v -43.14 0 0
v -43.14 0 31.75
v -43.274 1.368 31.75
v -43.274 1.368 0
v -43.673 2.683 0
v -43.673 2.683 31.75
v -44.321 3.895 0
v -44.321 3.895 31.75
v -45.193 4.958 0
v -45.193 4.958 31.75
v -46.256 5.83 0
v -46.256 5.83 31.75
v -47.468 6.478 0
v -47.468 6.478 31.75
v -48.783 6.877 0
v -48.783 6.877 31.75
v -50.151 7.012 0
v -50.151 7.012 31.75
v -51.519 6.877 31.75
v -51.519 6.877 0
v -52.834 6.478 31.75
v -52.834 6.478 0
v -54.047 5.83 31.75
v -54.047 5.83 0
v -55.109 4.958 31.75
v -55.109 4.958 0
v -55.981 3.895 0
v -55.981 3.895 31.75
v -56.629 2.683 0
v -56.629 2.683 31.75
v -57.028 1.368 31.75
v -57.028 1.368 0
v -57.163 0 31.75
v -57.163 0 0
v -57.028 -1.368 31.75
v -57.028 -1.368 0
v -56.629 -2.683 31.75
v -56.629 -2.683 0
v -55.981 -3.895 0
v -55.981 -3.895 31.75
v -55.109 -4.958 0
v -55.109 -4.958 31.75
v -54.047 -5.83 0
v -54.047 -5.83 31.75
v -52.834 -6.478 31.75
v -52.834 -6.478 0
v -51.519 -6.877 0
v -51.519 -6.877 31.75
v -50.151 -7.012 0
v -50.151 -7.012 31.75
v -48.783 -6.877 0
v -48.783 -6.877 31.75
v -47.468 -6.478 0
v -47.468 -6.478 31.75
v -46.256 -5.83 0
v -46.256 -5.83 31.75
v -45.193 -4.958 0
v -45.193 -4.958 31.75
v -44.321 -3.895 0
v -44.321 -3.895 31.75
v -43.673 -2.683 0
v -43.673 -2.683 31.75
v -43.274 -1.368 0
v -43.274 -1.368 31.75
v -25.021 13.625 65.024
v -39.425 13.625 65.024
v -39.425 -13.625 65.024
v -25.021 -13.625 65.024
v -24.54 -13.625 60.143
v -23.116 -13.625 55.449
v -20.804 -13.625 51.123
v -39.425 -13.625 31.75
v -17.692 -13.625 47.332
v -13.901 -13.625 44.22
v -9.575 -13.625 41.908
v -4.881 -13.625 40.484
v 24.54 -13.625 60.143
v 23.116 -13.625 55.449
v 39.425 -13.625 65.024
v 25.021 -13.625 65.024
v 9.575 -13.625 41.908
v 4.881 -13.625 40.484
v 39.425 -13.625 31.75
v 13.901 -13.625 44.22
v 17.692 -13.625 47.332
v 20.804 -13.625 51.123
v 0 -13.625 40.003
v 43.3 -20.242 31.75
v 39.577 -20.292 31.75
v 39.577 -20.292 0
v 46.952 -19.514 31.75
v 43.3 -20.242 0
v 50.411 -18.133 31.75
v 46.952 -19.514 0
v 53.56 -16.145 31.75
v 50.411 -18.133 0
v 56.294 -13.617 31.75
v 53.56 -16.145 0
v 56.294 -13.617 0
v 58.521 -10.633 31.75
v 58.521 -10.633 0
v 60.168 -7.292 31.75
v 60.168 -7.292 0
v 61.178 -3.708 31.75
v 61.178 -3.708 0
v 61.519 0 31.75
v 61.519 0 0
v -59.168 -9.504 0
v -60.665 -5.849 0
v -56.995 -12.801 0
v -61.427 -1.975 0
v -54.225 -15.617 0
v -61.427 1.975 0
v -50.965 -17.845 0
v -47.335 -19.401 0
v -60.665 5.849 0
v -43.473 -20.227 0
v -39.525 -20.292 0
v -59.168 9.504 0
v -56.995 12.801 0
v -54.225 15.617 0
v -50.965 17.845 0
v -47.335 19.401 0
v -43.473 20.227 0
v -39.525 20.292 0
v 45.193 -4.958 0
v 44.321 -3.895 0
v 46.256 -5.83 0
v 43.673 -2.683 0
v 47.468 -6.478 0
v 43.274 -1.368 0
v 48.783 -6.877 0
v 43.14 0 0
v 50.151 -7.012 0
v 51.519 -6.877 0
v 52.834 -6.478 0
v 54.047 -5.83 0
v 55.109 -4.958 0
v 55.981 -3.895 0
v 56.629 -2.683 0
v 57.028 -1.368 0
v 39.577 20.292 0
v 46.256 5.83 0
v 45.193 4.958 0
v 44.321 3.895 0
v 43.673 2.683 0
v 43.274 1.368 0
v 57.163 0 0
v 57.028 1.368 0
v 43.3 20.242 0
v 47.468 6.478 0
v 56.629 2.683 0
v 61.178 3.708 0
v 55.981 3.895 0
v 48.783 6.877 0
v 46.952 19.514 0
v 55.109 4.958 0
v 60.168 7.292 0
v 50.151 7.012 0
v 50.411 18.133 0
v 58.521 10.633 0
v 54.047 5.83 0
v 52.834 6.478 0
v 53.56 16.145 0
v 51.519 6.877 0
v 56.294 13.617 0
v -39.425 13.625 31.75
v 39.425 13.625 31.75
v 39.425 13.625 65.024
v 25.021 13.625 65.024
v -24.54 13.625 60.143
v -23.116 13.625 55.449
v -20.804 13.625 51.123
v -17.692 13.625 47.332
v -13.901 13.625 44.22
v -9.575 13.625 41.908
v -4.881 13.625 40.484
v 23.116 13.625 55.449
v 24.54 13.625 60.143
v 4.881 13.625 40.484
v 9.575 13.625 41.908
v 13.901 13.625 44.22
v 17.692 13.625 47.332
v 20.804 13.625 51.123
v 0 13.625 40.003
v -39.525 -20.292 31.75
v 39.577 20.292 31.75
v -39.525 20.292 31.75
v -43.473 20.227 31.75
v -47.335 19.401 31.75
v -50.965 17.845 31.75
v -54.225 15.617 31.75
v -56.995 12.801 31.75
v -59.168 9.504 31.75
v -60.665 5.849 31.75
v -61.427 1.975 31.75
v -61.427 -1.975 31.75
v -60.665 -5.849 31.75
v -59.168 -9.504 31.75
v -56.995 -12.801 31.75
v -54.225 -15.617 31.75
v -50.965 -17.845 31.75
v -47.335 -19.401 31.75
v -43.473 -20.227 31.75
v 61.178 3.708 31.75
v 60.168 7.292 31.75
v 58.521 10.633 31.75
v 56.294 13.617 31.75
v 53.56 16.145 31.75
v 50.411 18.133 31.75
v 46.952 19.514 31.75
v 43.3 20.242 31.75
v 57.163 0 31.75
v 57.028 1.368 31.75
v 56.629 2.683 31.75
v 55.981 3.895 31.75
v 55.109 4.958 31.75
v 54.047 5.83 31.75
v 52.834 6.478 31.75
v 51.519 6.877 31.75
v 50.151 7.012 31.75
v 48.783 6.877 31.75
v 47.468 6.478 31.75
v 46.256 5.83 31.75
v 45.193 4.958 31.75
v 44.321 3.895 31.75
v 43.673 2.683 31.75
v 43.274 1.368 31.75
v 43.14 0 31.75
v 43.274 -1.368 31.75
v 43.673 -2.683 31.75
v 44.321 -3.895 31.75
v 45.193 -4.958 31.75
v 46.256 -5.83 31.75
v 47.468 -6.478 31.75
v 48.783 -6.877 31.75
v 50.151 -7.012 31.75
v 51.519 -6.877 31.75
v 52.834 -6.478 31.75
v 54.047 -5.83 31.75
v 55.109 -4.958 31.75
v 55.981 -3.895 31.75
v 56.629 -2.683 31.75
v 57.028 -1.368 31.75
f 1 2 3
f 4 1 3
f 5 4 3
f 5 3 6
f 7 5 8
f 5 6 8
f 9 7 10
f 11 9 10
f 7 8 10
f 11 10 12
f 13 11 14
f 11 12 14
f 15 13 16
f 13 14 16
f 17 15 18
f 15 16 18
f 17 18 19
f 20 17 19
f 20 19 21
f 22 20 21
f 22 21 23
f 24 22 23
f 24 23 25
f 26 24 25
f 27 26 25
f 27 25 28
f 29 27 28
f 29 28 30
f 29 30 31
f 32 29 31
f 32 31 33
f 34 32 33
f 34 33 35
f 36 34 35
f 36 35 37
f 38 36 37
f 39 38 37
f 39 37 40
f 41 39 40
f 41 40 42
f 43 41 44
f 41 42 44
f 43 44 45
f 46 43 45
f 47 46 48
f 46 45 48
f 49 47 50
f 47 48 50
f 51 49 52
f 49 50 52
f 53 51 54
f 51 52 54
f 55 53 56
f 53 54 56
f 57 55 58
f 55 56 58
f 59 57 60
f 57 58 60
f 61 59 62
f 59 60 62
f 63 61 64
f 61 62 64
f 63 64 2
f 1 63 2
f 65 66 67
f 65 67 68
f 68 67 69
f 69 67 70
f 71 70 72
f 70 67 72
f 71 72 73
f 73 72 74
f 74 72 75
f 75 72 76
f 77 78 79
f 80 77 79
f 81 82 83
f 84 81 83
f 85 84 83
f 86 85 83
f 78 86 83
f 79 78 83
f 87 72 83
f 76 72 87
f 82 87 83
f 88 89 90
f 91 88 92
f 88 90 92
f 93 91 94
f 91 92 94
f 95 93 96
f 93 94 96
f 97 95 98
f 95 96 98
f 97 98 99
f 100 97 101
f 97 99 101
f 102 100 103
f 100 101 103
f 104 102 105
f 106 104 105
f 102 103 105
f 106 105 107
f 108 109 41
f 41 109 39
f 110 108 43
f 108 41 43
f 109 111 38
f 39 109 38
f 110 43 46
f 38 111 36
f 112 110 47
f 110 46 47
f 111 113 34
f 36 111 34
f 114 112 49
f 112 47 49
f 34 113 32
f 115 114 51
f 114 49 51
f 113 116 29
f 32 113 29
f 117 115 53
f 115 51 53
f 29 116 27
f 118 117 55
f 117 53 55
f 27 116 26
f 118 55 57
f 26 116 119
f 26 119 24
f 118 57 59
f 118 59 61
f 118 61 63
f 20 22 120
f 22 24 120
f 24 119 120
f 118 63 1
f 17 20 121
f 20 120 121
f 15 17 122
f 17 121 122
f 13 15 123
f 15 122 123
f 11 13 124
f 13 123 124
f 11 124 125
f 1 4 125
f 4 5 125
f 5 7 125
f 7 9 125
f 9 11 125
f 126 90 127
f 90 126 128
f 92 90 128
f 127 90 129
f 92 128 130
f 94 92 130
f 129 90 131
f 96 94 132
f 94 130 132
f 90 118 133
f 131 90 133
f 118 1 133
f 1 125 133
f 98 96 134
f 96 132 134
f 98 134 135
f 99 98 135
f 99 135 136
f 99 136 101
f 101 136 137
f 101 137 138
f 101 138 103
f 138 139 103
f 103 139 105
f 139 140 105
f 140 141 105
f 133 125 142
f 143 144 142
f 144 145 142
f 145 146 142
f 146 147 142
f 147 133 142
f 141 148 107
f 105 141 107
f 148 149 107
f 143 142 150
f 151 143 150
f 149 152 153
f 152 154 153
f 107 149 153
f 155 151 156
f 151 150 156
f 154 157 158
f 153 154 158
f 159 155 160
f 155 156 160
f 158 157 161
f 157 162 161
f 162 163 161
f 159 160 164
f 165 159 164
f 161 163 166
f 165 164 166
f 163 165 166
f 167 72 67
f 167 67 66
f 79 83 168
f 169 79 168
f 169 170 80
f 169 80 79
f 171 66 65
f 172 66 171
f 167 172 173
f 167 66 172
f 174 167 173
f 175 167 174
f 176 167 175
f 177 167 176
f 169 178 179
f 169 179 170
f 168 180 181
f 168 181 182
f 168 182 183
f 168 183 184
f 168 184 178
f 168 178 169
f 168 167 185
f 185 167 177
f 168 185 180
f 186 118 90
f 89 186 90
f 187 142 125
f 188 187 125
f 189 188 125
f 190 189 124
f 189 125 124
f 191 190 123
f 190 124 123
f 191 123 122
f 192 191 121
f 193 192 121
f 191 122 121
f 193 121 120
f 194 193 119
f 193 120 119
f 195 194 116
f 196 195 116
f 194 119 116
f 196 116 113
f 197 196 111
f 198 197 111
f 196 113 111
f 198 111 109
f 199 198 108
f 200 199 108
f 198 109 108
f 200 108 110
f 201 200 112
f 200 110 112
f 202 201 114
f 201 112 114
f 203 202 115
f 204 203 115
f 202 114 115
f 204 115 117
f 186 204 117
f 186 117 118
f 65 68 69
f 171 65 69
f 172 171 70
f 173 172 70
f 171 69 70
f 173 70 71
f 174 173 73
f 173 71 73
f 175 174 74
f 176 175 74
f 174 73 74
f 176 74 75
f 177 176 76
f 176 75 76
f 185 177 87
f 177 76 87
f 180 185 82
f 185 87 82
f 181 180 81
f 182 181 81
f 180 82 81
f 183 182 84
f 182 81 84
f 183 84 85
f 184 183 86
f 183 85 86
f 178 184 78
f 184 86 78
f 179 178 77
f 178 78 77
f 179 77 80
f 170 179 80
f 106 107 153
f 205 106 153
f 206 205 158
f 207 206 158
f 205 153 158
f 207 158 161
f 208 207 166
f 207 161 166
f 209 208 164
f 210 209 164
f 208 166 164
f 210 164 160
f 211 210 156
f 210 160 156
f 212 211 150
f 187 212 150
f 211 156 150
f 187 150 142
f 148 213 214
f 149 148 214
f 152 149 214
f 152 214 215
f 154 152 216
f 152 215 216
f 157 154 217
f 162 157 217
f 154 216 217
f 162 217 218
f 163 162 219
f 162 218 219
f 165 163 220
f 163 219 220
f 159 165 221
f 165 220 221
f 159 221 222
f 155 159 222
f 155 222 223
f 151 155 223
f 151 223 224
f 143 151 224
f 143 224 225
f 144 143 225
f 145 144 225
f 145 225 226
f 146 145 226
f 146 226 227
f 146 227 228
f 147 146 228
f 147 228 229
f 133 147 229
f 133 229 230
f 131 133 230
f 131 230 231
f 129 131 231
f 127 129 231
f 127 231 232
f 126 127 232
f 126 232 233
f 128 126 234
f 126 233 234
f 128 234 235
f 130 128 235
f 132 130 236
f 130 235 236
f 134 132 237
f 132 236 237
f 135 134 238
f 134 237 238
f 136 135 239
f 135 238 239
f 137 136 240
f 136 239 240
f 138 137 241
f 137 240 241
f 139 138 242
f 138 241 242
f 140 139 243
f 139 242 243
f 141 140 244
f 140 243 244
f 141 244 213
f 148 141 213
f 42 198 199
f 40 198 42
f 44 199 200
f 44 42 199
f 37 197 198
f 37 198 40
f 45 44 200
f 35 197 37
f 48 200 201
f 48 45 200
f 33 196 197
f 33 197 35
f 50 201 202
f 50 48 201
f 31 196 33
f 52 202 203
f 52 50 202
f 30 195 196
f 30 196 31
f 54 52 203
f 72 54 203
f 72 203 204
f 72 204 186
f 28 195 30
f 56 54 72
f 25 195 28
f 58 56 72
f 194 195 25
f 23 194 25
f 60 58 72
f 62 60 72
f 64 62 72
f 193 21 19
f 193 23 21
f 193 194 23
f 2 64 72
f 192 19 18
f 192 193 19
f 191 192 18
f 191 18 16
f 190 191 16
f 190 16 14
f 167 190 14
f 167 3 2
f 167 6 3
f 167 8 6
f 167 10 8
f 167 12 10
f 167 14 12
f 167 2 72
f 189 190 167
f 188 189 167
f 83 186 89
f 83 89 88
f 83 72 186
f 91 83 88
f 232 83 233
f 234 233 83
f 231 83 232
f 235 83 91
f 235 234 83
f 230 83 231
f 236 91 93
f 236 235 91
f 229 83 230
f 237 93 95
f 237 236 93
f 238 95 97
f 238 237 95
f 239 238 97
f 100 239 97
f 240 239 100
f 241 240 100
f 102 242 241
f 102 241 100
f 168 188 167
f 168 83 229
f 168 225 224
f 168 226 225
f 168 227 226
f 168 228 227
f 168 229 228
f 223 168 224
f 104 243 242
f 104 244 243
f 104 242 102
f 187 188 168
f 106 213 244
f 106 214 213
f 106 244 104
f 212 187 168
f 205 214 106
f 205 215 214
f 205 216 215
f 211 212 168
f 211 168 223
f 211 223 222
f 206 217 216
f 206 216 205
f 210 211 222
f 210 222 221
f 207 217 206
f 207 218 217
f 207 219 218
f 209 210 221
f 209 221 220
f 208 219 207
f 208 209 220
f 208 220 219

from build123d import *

# Parameters (mm, degrees)
F1_DEPTH = 31.75
F2_R     = 7.0115347254
F3_DEPTH = 31.751
F4_W     = 78.8504332304
F4_H     = 27.2497832775
F5_DEPTH = 33.274
F7_DEPTH = 33.9844357044


# Not quite as in the source:
# - a feature of the source that left no trace in its solid (it failed there, or was rolled back) is left out


with BuildPart() as f1:
    # F0 (on Top) → F1 (new body)
    with BuildSketch(Plane.XY):
        with BuildLine():
            Line((39.576777419, 20.2923920006), (-39.5247050543, 20.2923920006))
            ThreePointArc((-39.5247050543, 20.2923920006), (-26.2003502762, 13.8037157784), (-20.8060217658, 0))
            ThreePointArc((-20.8060217658, 0), (-26.2003502762, -13.8037157784), (-39.5247050543, -20.2923920006))
            Line((-39.5247050543, -20.2923920006), (39.576777419, -20.2923920006))
            ThreePointArc((39.576777419, -20.2923920006), (20.8101499679, 0), (39.576777419, 20.2923920006))
        make_face()
        with BuildLine():
            Line((-39.5247050543, 20.2923920006), (-41.1645658314, 20.2923920006))
            Line((-41.1645658314, 20.2923920006), (-41.1645658314, -20.2923920006))
            Line((-41.1645658314, -20.2923920006), (-39.5247050543, -20.2923920006))
            ThreePointArc((-39.5247050543, -20.2923920006), (-26.2003502762, -13.8037157784), (-20.8060217658, 0))
            ThreePointArc((-20.8060217658, 0), (-26.2003502762, 13.8037157784), (-39.5247050543, 20.2923920006))
        make_face()
        with BuildLine():
            Line((-41.1645658314, -20.2923920006), (-41.1645658314, 20.2923920006))
            Line((-41.1645658314, 20.2923920006), (-39.5247050543, 20.2923920006))
            ThreePointArc((-39.5247050543, 20.2923920006), (-61.5231098971, 0), (-39.5247050543, -20.2923920006))
            Line((-39.5247050543, -20.2923920006), (-41.1645658314, -20.2923920006))
        make_face()
        with BuildLine():
            Line((41.1645658314, 20.2923920006), (39.576777419, 20.2923920006))
            ThreePointArc((39.576777419, 20.2923920006), (20.8101499679, 0), (39.576777419, -20.2923920006))
            Line((39.576777419, -20.2923920006), (41.1645658314, -20.2923920006))
            Line((41.1645658314, -20.2923920006), (41.1645658314, 20.2923920006))
        make_face()
        with BuildLine():
            ThreePointArc((61.518981695, 0), (54.9845466472, 14.9435730466), (39.576777419, 20.2923920006))
            Line((39.576777419, 20.2923920006), (41.1645658314, 20.2923920006))
            Line((41.1645658314, 20.2923920006), (41.1645658314, -20.2923920006))
            Line((41.1645658314, -20.2923920006), (39.576777419, -20.2923920006))
            ThreePointArc((39.576777419, -20.2923920006), (54.9845466472, -14.9435730466), (61.518981695, 0))
        make_face()
    extrude(amount=F1_DEPTH)

    # F2 (on face) → F3 (cut, through all)
    with BuildSketch(Plane.XY.offset(31.75)):
        with Locations((50.1511953771, 0)):
            Circle(F2_R)
        with Locations((-50.1511953771, 0)):
            Circle(F2_R)
    extrude(amount=-F3_DEPTH, mode=Mode.SUBTRACT)

    # F4 (on face) → F5 (join)
    with BuildSketch(Plane.XY.offset(31.75)):
        Rectangle(F4_W, F4_H)
    extrude(amount=F5_DEPTH)

    # F6 (on face) → F7 (cut, through all)
    with BuildSketch(Plane.XZ.offset(13.6248916388)):
        with BuildLine():
            ThreePointArc((-25.020677247, 65.024), (0, 40.003322753), (25.020677247, 65.024))
            Line((25.020677247, 65.024), (-25.020677247, 65.024))
        make_face()
    extrude(amount=-F7_DEPTH, mode=Mode.SUBTRACT)


solid = f1.part
